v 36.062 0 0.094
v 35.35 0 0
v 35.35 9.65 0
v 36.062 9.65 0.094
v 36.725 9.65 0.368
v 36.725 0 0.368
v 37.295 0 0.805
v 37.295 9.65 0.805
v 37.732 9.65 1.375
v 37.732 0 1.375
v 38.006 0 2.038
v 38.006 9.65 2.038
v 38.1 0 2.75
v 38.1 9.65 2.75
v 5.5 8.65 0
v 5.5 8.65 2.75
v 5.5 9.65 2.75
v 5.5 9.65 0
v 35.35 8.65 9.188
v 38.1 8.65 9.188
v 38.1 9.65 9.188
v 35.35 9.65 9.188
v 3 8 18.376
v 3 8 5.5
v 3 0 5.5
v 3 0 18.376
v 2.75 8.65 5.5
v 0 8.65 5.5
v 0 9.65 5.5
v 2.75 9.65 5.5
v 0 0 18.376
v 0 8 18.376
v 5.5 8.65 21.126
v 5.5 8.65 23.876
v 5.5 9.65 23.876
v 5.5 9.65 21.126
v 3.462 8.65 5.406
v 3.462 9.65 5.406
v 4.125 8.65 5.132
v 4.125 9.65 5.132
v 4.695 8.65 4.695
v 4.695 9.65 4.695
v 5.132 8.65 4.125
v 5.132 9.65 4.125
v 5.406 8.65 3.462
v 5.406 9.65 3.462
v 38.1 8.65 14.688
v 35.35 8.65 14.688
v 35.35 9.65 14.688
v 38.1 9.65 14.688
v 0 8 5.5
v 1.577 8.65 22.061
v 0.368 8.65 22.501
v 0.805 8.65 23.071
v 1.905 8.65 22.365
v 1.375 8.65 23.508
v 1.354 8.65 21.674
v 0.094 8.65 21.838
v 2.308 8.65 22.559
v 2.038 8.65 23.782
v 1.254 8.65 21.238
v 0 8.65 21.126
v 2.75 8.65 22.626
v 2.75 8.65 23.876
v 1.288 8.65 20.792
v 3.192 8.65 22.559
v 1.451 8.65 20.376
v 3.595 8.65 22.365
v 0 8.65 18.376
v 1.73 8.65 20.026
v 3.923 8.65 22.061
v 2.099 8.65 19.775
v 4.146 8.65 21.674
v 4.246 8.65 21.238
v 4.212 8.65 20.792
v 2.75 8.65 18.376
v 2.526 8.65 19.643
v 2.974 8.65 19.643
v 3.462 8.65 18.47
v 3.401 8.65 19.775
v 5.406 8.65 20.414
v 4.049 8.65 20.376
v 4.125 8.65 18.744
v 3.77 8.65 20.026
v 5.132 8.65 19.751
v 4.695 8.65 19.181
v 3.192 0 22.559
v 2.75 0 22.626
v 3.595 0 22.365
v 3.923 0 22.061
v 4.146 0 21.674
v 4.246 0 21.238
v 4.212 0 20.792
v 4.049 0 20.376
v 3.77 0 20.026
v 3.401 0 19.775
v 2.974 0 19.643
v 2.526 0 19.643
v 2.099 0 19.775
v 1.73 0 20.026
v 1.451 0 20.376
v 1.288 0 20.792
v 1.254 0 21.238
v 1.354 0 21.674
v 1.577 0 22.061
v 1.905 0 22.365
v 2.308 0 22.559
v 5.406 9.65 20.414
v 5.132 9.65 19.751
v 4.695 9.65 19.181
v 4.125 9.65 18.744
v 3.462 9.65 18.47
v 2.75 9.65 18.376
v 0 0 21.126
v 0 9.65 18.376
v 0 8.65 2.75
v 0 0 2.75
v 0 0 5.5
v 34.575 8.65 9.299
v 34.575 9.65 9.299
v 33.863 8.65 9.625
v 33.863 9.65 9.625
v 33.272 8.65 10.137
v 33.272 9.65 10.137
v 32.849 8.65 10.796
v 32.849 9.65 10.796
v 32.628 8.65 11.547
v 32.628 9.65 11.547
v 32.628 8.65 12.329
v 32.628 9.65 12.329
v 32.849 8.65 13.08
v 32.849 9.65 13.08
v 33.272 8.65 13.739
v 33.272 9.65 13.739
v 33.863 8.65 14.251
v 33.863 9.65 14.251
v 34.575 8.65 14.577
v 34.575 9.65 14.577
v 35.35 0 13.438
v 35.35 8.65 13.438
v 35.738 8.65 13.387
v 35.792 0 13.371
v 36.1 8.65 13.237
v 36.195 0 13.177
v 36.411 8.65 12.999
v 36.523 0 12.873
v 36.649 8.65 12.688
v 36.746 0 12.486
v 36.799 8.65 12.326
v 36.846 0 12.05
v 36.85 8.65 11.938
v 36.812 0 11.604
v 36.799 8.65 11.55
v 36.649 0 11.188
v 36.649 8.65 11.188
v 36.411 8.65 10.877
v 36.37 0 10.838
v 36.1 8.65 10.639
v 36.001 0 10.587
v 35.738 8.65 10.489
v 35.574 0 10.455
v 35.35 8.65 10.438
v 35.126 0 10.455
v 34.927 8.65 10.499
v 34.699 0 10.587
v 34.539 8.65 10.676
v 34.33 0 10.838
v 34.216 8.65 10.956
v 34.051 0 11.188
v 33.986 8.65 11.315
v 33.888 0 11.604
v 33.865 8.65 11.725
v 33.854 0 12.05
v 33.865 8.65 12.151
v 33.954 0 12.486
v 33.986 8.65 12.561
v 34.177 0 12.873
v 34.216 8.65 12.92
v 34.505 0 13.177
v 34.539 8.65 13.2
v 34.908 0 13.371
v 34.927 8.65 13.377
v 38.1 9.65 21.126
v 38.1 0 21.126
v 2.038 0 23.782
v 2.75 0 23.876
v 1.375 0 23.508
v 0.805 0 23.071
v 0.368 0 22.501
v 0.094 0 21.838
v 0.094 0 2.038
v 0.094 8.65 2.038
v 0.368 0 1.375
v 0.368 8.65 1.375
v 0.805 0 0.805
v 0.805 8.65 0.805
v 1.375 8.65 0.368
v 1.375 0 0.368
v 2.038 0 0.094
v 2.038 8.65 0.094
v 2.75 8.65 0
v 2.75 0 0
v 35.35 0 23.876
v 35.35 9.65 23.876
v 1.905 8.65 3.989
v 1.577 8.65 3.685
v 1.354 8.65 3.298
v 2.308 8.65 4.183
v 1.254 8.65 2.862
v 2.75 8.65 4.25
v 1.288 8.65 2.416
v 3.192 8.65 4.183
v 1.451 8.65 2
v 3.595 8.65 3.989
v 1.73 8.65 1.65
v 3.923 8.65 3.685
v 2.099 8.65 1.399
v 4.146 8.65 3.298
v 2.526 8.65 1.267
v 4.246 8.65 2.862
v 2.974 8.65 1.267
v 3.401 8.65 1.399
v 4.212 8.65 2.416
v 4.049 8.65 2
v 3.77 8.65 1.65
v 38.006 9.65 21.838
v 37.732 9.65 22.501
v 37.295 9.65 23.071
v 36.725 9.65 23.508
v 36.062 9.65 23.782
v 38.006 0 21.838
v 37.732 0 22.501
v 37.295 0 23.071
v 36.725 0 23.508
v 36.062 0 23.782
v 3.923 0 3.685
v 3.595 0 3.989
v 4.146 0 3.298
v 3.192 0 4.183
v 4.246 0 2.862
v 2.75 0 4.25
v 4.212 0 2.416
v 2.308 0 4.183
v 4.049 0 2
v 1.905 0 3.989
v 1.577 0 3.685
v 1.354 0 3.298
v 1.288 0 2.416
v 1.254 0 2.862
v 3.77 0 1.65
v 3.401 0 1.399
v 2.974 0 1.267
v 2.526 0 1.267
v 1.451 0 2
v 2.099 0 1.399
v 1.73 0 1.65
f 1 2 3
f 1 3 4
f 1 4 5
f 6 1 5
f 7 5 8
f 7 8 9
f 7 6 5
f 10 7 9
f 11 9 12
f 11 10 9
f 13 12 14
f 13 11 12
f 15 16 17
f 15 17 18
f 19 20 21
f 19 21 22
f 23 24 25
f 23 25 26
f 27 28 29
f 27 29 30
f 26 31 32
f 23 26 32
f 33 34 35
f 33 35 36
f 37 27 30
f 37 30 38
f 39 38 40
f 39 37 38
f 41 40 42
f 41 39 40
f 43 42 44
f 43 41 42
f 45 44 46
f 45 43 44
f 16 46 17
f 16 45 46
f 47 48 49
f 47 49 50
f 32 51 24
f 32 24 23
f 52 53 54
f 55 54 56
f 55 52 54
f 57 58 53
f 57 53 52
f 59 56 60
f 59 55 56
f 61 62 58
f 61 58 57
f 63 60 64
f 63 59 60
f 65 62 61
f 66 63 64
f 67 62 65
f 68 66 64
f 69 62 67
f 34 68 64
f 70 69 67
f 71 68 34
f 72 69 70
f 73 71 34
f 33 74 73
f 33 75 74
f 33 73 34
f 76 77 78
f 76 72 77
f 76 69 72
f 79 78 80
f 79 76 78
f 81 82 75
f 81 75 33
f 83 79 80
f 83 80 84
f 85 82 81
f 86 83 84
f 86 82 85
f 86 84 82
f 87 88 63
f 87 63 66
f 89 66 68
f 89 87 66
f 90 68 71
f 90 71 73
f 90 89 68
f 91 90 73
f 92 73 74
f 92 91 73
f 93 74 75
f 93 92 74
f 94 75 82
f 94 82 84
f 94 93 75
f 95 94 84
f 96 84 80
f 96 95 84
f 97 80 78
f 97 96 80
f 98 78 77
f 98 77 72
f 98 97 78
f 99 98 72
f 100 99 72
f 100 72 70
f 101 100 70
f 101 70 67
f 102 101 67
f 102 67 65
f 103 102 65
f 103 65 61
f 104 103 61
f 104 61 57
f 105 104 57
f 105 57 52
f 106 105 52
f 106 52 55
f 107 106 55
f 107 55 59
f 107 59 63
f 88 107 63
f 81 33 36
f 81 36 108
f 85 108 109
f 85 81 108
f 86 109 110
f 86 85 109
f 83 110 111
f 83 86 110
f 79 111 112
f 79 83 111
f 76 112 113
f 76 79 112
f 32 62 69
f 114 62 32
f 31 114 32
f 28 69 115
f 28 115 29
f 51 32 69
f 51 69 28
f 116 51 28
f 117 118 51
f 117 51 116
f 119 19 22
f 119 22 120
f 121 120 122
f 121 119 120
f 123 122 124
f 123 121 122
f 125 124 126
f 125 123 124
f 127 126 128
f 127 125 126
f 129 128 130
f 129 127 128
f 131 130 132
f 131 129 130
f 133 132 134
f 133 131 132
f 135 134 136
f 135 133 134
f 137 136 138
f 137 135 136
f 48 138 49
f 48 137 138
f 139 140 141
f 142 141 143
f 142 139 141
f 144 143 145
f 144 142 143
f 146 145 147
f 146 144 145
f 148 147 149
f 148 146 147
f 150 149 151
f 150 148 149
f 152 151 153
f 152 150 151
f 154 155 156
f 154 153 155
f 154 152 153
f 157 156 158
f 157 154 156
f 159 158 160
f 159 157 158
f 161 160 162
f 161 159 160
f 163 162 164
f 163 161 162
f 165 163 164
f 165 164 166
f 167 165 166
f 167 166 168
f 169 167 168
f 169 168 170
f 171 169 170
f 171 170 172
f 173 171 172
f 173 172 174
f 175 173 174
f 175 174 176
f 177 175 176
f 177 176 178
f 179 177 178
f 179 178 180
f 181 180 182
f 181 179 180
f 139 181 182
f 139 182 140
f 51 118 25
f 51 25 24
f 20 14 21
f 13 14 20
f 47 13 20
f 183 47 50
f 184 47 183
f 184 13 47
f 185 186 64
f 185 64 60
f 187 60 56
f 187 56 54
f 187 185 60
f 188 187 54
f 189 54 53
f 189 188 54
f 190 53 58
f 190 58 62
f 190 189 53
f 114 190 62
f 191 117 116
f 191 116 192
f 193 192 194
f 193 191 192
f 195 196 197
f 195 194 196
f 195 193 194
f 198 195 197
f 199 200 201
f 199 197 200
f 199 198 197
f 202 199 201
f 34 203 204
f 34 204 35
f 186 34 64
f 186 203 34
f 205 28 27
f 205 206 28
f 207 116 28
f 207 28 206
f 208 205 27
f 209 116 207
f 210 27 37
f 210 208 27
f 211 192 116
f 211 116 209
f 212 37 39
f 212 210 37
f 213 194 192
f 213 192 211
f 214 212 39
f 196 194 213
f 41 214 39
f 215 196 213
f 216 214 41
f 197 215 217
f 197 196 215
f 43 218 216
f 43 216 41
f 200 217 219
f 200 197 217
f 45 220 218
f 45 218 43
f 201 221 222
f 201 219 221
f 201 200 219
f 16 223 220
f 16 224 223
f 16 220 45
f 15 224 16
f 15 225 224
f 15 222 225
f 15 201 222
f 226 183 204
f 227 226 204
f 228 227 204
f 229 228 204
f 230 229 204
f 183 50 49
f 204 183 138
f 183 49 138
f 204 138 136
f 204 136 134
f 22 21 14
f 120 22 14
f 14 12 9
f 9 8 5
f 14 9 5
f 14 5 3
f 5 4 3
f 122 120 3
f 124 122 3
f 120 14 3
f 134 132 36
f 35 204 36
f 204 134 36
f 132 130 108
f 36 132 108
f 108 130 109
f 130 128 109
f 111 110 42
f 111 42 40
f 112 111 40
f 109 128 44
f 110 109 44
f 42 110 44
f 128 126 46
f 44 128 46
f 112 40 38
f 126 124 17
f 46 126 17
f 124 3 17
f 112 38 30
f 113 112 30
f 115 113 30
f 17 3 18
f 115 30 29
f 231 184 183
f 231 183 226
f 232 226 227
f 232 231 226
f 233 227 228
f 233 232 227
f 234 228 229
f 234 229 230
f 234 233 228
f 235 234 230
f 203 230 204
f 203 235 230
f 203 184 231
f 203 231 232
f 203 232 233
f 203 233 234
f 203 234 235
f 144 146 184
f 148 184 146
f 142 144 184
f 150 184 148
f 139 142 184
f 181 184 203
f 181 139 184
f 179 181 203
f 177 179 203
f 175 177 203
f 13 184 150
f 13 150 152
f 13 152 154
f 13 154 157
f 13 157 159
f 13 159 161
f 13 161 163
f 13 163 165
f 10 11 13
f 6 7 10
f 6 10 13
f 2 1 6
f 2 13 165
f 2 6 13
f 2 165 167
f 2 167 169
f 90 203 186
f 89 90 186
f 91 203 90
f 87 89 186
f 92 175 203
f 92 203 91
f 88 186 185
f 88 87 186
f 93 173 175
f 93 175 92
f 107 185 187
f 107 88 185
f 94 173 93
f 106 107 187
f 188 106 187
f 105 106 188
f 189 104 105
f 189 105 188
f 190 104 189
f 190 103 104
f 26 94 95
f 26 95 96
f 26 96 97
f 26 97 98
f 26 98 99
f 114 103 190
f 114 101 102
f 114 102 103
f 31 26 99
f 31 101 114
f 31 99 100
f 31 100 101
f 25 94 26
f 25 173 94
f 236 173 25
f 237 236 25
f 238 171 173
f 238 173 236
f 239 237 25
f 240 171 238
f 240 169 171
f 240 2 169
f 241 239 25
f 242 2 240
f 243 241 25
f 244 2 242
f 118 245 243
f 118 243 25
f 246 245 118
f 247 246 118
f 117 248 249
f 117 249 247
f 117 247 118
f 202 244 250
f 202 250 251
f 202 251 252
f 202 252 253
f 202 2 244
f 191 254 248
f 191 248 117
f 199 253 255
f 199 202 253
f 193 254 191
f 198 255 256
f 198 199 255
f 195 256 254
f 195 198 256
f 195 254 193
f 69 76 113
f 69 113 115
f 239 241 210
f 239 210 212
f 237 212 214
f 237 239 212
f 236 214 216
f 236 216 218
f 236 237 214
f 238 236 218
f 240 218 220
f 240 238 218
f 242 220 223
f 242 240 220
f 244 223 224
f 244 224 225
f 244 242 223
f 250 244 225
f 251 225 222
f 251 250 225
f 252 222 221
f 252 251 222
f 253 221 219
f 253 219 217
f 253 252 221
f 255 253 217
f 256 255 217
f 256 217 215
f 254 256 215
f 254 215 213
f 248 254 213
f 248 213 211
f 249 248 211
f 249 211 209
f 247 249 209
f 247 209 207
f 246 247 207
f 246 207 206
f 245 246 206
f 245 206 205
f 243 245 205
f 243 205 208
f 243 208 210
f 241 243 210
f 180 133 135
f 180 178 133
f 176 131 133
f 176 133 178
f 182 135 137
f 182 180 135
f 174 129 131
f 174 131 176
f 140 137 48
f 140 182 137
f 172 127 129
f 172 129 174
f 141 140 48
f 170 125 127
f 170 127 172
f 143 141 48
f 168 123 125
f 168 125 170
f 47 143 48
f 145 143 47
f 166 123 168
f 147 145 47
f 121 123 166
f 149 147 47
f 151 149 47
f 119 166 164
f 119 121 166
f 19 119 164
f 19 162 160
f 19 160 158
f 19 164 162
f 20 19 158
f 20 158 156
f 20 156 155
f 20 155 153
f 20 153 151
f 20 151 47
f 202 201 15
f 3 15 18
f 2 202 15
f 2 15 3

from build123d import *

# Parameters (mm, degrees)
SKETCH1_R           = 1.5
BOSS_EXTRUDE1_DEPTH = 9.65
CUT_EXTRUDE1_START  = -1
SKETCH2_R           = 1.5
CUT_EXTRUDE1_DEPTH  = 1
SKETCH4_W           = 12.876
SKETCH4_H           = 8
CUT_EXTRUDE2_DEPTH  = 3


with BuildPart() as part:
    # Sketch1 → Boss-Extrude1 (new body)
    with BuildSketch(Plane(origin=(0, 0, 0), x_dir=(1, 0, 0), z_dir=(0, 1, 0))):
        with BuildLine():
            Line((2.75, 0), (35.35, 0))
            ThreePointArc((35.35, 0), (37.294543648, -0.805456352), (38.1, -2.75))
            Line((38.1, -2.75), (38.1, -21.126))
            ThreePointArc((38.1, -21.126), (37.294543648, -23.070543648), (35.35, -23.876))
            Line((35.35, -23.876), (2.75, -23.876))
            ThreePointArc((2.75, -23.876), (0.805456352, -23.070543648), (0, -21.126))
            Line((0, -21.126), (0, -2.75))
            ThreePointArc((0, -2.75), (0.805456352, -0.805456352), (2.75, 0))
        make_face()
        with Locations(Location((2.75, -2.75, 0), (0, 0, 270))):
            Circle(SKETCH1_R, mode=Mode.SUBTRACT)
        with Locations(Location((2.75, -21.126, 0), (0, 0, 270))):
            Circle(SKETCH1_R, mode=Mode.SUBTRACT)
        with Locations(Location((35.35, -11.938, 0), (0, 0, 270))):
            Circle(SKETCH1_R, mode=Mode.SUBTRACT)
    extrude(amount=BOSS_EXTRUDE1_DEPTH)

    # Sketch2 → Cut-Extrude1 (cut)
    # profile 1 of 20: a face of its own
    with BuildSketch(Plane(origin=(0, 9.65, 0), x_dir=(1, 0, 0), z_dir=(0, 1, 0)).offset(CUT_EXTRUDE1_START)):
        with BuildLine():
            Line((2.75, -18.376), (0, -18.376))
            Line((0, -18.376), (0, -21.126))
            ThreePointArc((0, -21.126), (0.805456352, -19.181456352), (2.75, -18.376))
        make_face()
    # profile 2 of 20: a face of its own
    with BuildSketch(Plane(origin=(0, 9.65, 0), x_dir=(1, 0, 0), z_dir=(0, 1, 0)).offset(CUT_EXTRUDE1_START)):
        with BuildLine():
            ThreePointArc((2.75, -23.876), (0.805456352, -23.070543648), (0, -21.126))
            Line((0, -21.126), (0, -23.876))
            Line((0, -23.876), (2.75, -23.876))
        make_face()
    # profile 3 of 20: a face of its own
    with BuildSketch(Plane(origin=(0, 9.65, 0), x_dir=(1, 0, 0), z_dir=(0, 1, 0)).offset(CUT_EXTRUDE1_START)):
        with BuildLine():
            ThreePointArc((5.5, -21.126), (4.694543648, -19.181456352), (2.75, -18.376))
            ThreePointArc((2.75, -18.376), (0.805456352, -19.181456352), (0, -21.126))
            ThreePointArc((0, -21.126), (0.805456352, -23.070543648), (2.75, -23.876))
            ThreePointArc((2.75, -23.876), (4.694543648, -23.070543648), (5.5, -21.126))
        make_face()
        with Locations(Location((2.75, -21.126, 0), (0, 0, 270))):
            Circle(SKETCH2_R, mode=Mode.SUBTRACT)
    # profile 4 of 20: a face of its own
    with BuildSketch(Plane(origin=(0, 9.65, 0), x_dir=(1, 0, 0), z_dir=(0, 1, 0)).offset(CUT_EXTRUDE1_START)):
        with Locations(Location((2.75, -21.126, 0), (0, 0, 270))):
            Circle(SKETCH2_R)
    # profile 5 of 20: a face of its own
    with BuildSketch(Plane(origin=(0, 9.65, 0), x_dir=(1, 0, 0), z_dir=(0, 1, 0)).offset(CUT_EXTRUDE1_START)):
        with BuildLine():
            Line((5.5, -23.876), (5.5, -21.126))
            ThreePointArc((5.5, -21.126), (4.694543648, -23.070543648), (2.75, -23.876))
            Line((2.75, -23.876), (5.5, -23.876))
        make_face()
    # profile 6 of 20: a face of its own
    with BuildSketch(Plane(origin=(0, 9.65, 0), x_dir=(1, 0, 0), z_dir=(0, 1, 0)).offset(CUT_EXTRUDE1_START)):
        with BuildLine():
            ThreePointArc((0, -2.75), (0.805456352, -4.694543648), (2.75, -5.5))
            ThreePointArc((2.75, -5.5), (4.694543648, -4.694543648), (5.5, -2.75))
            ThreePointArc((5.5, -2.75), (4.694543648, -0.805456352), (2.75, 0))
            ThreePointArc((2.75, 0), (0.805456352, -0.805456352), (0, -2.75))
        make_face()
        with Locations(Location((2.75, -2.75, 0), (0, 0, 270))):
            Circle(SKETCH2_R, mode=Mode.SUBTRACT)
    # profile 7 of 20: a face of its own
    with BuildSketch(Plane(origin=(0, 9.65, 0), x_dir=(1, 0, 0), z_dir=(0, 1, 0)).offset(CUT_EXTRUDE1_START)):
        with Locations(Location((2.75, -2.75, 0), (0, 0, 270))):
            Circle(SKETCH2_R)
    # profile 8 of 20: a face of its own
    with BuildSketch(Plane(origin=(0, 9.65, 0), x_dir=(1, 0, 0), z_dir=(0, 1, 0)).offset(CUT_EXTRUDE1_START)):
        with BuildLine():
            Line((0, -5.5), (2.75, -5.5))
            ThreePointArc((2.75, -5.5), (0.805456352, -4.694543648), (0, -2.75))
            Line((0, -2.75), (0, -5.5))
        make_face()
    # profile 9 of 20: a face of its own
    with BuildSketch(Plane(origin=(0, 9.65, 0), x_dir=(1, 0, 0), z_dir=(0, 1, 0)).offset(CUT_EXTRUDE1_START)):
        with BuildLine():
            Line((0, 0), (0, -2.75))
            ThreePointArc((0, -2.75), (0.805456352, -0.805456352), (2.75, 0))
            Line((2.75, 0), (0, 0))
        make_face()
    # profile 10 of 20: a face of its own
    with BuildSketch(Plane(origin=(0, 9.65, 0), x_dir=(1, 0, 0), z_dir=(0, 1, 0)).offset(CUT_EXTRUDE1_START)):
        with BuildLine():
            ThreePointArc((2.75, 0), (4.694543648, -0.805456352), (5.5, -2.75))
            Line((5.5, -2.75), (5.5, 0))
            Line((5.5, 0), (2.75, 0))
        make_face()
    # profile 11 of 20: a face of its own
    with BuildSketch(Plane(origin=(0, 9.65, 0), x_dir=(1, 0, 0), z_dir=(0, 1, 0)).offset(CUT_EXTRUDE1_START)):
        with BuildLine():
            ThreePointArc((38.1, -11.938), (37.294543648, -9.993456352), (35.35, -9.188))
            Line((35.35, -9.188), (35.35, -10.438))
            ThreePointArc((35.35, -10.438), (36.410660172, -10.877339828), (36.85, -11.938))
            ThreePointArc((36.85, -11.938), (36.410660172, -12.998660172), (35.35, -13.438))
            Line((35.35, -13.438), (35.35, -14.688))
            ThreePointArc((35.35, -14.688), (37.294543648, -13.882543648), (38.1, -11.938))
        make_face()
    # profile 12 of 20: a face of its own
    with BuildSketch(Plane(origin=(0, 9.65, 0), x_dir=(1, 0, 0), z_dir=(0, 1, 0)).offset(CUT_EXTRUDE1_START)):
        with BuildLine():
            Line((35.35, -10.438), (35.35, -9.188))
            ThreePointArc((35.35, -9.188), (32.6, -11.938), (35.35, -14.688))
            Line((35.35, -14.688), (35.35, -13.438))
            ThreePointArc((35.35, -13.438), (33.85, -11.938), (35.35, -10.438))
        make_face()
    # profile 13 of 20: a face of its own
    with BuildSketch(Plane(origin=(0, 9.65, 0), x_dir=(1, 0, 0), z_dir=(0, 1, 0)).offset(CUT_EXTRUDE1_START)):
        with BuildLine():
            ThreePointArc((36.85, -11.938), (36.410660172, -10.877339828), (35.35, -10.438))
            Line((35.35, -10.438), (35.35, -13.438))
            ThreePointArc((35.35, -13.438), (36.410660172, -12.998660172), (36.85, -11.938))
        make_face()
    # profile 14 of 20: a face of its own
    with BuildSketch(Plane(origin=(0, 9.65, 0), x_dir=(1, 0, 0), z_dir=(0, 1, 0)).offset(CUT_EXTRUDE1_START)):
        with BuildLine():
            Line((35.35, -13.438), (35.35, -10.438))
            ThreePointArc((35.35, -10.438), (33.85, -11.938), (35.35, -13.438))
        make_face()
    # profile 15 of 20: a face of its own
    with BuildSketch(Plane(origin=(0, 9.65, 0), x_dir=(1, 0, 0), z_dir=(0, 1, 0)).offset(CUT_EXTRUDE1_START)):
        with BuildLine():
            ThreePointArc((36.85, -11.938), (36.410660172, -10.877339828), (35.35, -10.438))
            Line((35.35, -10.438), (35.35, -13.438))
            ThreePointArc((35.35, -13.438), (36.410660172, -12.998660172), (36.85, -11.938))
        make_face()
    # profile 16 of 20: a face of its own
    with BuildSketch(Plane(origin=(0, 9.65, 0), x_dir=(1, 0, 0), z_dir=(0, 1, 0)).offset(CUT_EXTRUDE1_START)):
        with BuildLine():
            Line((35.35, -13.438), (35.35, -10.438))
            ThreePointArc((35.35, -10.438), (33.85, -11.938), (35.35, -13.438))
        make_face()
    # profile 17 of 20: a face of its own
    with BuildSketch(Plane(origin=(0, 9.65, 0), x_dir=(1, 0, 0), z_dir=(0, 1, 0)).offset(CUT_EXTRUDE1_START)):
        with BuildLine():
            ThreePointArc((38.1, -11.938), (37.294543648, -9.993456352), (35.35, -9.188))
            Line((35.35, -9.188), (35.35, -10.438))
            ThreePointArc((35.35, -10.438), (36.410660172, -10.877339828), (36.85, -11.938))
            ThreePointArc((36.85, -11.938), (36.410660172, -12.998660172), (35.35, -13.438))
            Line((35.35, -13.438), (35.35, -14.688))
            ThreePointArc((35.35, -14.688), (37.294543648, -13.882543648), (38.1, -11.938))
        make_face()
    # profile 18 of 20: a face of its own
    with BuildSketch(Plane(origin=(0, 9.65, 0), x_dir=(1, 0, 0), z_dir=(0, 1, 0)).offset(CUT_EXTRUDE1_START)):
        with BuildLine():
            Line((35.35, -10.438), (35.35, -9.188))
            ThreePointArc((35.35, -9.188), (32.6, -11.938), (35.35, -14.688))
            Line((35.35, -14.688), (35.35, -13.438))
            ThreePointArc((35.35, -13.438), (33.85, -11.938), (35.35, -10.438))
        make_face()
    # profile 19 of 20: a face of its own
    with BuildSketch(Plane(origin=(0, 9.65, 0), x_dir=(1, 0, 0), z_dir=(0, 1, 0)).offset(CUT_EXTRUDE1_START)):
        with BuildLine():
            Line((38.1, -14.688), (38.1, -11.938))
            ThreePointArc((38.1, -11.938), (37.294543648, -13.882543648), (35.35, -14.688))
            Line((35.35, -14.688), (38.1, -14.688))
        make_face()
    # profile 20 of 20: a face of its own
    with BuildSketch(Plane(origin=(0, 9.65, 0), x_dir=(1, 0, 0), z_dir=(0, 1, 0)).offset(CUT_EXTRUDE1_START)):
        with BuildLine():
            Line((38.1, -9.188), (35.35, -9.188))
            ThreePointArc((35.35, -9.188), (37.294543648, -9.993456352), (38.1, -11.938))
            Line((38.1, -11.938), (38.1, -9.188))
        make_face()
    extrude(amount=CUT_EXTRUDE1_DEPTH, mode=Mode.SUBTRACT)

    # Sketch4 → Cut-Extrude2 (cut)
    with BuildSketch(Plane.ZY):
        with Locations((11.938, 4)):
            Rectangle(SKETCH4_W, SKETCH4_H)
    extrude(amount=-CUT_EXTRUDE2_DEPTH, mode=Mode.SUBTRACT)


solid = part.part
